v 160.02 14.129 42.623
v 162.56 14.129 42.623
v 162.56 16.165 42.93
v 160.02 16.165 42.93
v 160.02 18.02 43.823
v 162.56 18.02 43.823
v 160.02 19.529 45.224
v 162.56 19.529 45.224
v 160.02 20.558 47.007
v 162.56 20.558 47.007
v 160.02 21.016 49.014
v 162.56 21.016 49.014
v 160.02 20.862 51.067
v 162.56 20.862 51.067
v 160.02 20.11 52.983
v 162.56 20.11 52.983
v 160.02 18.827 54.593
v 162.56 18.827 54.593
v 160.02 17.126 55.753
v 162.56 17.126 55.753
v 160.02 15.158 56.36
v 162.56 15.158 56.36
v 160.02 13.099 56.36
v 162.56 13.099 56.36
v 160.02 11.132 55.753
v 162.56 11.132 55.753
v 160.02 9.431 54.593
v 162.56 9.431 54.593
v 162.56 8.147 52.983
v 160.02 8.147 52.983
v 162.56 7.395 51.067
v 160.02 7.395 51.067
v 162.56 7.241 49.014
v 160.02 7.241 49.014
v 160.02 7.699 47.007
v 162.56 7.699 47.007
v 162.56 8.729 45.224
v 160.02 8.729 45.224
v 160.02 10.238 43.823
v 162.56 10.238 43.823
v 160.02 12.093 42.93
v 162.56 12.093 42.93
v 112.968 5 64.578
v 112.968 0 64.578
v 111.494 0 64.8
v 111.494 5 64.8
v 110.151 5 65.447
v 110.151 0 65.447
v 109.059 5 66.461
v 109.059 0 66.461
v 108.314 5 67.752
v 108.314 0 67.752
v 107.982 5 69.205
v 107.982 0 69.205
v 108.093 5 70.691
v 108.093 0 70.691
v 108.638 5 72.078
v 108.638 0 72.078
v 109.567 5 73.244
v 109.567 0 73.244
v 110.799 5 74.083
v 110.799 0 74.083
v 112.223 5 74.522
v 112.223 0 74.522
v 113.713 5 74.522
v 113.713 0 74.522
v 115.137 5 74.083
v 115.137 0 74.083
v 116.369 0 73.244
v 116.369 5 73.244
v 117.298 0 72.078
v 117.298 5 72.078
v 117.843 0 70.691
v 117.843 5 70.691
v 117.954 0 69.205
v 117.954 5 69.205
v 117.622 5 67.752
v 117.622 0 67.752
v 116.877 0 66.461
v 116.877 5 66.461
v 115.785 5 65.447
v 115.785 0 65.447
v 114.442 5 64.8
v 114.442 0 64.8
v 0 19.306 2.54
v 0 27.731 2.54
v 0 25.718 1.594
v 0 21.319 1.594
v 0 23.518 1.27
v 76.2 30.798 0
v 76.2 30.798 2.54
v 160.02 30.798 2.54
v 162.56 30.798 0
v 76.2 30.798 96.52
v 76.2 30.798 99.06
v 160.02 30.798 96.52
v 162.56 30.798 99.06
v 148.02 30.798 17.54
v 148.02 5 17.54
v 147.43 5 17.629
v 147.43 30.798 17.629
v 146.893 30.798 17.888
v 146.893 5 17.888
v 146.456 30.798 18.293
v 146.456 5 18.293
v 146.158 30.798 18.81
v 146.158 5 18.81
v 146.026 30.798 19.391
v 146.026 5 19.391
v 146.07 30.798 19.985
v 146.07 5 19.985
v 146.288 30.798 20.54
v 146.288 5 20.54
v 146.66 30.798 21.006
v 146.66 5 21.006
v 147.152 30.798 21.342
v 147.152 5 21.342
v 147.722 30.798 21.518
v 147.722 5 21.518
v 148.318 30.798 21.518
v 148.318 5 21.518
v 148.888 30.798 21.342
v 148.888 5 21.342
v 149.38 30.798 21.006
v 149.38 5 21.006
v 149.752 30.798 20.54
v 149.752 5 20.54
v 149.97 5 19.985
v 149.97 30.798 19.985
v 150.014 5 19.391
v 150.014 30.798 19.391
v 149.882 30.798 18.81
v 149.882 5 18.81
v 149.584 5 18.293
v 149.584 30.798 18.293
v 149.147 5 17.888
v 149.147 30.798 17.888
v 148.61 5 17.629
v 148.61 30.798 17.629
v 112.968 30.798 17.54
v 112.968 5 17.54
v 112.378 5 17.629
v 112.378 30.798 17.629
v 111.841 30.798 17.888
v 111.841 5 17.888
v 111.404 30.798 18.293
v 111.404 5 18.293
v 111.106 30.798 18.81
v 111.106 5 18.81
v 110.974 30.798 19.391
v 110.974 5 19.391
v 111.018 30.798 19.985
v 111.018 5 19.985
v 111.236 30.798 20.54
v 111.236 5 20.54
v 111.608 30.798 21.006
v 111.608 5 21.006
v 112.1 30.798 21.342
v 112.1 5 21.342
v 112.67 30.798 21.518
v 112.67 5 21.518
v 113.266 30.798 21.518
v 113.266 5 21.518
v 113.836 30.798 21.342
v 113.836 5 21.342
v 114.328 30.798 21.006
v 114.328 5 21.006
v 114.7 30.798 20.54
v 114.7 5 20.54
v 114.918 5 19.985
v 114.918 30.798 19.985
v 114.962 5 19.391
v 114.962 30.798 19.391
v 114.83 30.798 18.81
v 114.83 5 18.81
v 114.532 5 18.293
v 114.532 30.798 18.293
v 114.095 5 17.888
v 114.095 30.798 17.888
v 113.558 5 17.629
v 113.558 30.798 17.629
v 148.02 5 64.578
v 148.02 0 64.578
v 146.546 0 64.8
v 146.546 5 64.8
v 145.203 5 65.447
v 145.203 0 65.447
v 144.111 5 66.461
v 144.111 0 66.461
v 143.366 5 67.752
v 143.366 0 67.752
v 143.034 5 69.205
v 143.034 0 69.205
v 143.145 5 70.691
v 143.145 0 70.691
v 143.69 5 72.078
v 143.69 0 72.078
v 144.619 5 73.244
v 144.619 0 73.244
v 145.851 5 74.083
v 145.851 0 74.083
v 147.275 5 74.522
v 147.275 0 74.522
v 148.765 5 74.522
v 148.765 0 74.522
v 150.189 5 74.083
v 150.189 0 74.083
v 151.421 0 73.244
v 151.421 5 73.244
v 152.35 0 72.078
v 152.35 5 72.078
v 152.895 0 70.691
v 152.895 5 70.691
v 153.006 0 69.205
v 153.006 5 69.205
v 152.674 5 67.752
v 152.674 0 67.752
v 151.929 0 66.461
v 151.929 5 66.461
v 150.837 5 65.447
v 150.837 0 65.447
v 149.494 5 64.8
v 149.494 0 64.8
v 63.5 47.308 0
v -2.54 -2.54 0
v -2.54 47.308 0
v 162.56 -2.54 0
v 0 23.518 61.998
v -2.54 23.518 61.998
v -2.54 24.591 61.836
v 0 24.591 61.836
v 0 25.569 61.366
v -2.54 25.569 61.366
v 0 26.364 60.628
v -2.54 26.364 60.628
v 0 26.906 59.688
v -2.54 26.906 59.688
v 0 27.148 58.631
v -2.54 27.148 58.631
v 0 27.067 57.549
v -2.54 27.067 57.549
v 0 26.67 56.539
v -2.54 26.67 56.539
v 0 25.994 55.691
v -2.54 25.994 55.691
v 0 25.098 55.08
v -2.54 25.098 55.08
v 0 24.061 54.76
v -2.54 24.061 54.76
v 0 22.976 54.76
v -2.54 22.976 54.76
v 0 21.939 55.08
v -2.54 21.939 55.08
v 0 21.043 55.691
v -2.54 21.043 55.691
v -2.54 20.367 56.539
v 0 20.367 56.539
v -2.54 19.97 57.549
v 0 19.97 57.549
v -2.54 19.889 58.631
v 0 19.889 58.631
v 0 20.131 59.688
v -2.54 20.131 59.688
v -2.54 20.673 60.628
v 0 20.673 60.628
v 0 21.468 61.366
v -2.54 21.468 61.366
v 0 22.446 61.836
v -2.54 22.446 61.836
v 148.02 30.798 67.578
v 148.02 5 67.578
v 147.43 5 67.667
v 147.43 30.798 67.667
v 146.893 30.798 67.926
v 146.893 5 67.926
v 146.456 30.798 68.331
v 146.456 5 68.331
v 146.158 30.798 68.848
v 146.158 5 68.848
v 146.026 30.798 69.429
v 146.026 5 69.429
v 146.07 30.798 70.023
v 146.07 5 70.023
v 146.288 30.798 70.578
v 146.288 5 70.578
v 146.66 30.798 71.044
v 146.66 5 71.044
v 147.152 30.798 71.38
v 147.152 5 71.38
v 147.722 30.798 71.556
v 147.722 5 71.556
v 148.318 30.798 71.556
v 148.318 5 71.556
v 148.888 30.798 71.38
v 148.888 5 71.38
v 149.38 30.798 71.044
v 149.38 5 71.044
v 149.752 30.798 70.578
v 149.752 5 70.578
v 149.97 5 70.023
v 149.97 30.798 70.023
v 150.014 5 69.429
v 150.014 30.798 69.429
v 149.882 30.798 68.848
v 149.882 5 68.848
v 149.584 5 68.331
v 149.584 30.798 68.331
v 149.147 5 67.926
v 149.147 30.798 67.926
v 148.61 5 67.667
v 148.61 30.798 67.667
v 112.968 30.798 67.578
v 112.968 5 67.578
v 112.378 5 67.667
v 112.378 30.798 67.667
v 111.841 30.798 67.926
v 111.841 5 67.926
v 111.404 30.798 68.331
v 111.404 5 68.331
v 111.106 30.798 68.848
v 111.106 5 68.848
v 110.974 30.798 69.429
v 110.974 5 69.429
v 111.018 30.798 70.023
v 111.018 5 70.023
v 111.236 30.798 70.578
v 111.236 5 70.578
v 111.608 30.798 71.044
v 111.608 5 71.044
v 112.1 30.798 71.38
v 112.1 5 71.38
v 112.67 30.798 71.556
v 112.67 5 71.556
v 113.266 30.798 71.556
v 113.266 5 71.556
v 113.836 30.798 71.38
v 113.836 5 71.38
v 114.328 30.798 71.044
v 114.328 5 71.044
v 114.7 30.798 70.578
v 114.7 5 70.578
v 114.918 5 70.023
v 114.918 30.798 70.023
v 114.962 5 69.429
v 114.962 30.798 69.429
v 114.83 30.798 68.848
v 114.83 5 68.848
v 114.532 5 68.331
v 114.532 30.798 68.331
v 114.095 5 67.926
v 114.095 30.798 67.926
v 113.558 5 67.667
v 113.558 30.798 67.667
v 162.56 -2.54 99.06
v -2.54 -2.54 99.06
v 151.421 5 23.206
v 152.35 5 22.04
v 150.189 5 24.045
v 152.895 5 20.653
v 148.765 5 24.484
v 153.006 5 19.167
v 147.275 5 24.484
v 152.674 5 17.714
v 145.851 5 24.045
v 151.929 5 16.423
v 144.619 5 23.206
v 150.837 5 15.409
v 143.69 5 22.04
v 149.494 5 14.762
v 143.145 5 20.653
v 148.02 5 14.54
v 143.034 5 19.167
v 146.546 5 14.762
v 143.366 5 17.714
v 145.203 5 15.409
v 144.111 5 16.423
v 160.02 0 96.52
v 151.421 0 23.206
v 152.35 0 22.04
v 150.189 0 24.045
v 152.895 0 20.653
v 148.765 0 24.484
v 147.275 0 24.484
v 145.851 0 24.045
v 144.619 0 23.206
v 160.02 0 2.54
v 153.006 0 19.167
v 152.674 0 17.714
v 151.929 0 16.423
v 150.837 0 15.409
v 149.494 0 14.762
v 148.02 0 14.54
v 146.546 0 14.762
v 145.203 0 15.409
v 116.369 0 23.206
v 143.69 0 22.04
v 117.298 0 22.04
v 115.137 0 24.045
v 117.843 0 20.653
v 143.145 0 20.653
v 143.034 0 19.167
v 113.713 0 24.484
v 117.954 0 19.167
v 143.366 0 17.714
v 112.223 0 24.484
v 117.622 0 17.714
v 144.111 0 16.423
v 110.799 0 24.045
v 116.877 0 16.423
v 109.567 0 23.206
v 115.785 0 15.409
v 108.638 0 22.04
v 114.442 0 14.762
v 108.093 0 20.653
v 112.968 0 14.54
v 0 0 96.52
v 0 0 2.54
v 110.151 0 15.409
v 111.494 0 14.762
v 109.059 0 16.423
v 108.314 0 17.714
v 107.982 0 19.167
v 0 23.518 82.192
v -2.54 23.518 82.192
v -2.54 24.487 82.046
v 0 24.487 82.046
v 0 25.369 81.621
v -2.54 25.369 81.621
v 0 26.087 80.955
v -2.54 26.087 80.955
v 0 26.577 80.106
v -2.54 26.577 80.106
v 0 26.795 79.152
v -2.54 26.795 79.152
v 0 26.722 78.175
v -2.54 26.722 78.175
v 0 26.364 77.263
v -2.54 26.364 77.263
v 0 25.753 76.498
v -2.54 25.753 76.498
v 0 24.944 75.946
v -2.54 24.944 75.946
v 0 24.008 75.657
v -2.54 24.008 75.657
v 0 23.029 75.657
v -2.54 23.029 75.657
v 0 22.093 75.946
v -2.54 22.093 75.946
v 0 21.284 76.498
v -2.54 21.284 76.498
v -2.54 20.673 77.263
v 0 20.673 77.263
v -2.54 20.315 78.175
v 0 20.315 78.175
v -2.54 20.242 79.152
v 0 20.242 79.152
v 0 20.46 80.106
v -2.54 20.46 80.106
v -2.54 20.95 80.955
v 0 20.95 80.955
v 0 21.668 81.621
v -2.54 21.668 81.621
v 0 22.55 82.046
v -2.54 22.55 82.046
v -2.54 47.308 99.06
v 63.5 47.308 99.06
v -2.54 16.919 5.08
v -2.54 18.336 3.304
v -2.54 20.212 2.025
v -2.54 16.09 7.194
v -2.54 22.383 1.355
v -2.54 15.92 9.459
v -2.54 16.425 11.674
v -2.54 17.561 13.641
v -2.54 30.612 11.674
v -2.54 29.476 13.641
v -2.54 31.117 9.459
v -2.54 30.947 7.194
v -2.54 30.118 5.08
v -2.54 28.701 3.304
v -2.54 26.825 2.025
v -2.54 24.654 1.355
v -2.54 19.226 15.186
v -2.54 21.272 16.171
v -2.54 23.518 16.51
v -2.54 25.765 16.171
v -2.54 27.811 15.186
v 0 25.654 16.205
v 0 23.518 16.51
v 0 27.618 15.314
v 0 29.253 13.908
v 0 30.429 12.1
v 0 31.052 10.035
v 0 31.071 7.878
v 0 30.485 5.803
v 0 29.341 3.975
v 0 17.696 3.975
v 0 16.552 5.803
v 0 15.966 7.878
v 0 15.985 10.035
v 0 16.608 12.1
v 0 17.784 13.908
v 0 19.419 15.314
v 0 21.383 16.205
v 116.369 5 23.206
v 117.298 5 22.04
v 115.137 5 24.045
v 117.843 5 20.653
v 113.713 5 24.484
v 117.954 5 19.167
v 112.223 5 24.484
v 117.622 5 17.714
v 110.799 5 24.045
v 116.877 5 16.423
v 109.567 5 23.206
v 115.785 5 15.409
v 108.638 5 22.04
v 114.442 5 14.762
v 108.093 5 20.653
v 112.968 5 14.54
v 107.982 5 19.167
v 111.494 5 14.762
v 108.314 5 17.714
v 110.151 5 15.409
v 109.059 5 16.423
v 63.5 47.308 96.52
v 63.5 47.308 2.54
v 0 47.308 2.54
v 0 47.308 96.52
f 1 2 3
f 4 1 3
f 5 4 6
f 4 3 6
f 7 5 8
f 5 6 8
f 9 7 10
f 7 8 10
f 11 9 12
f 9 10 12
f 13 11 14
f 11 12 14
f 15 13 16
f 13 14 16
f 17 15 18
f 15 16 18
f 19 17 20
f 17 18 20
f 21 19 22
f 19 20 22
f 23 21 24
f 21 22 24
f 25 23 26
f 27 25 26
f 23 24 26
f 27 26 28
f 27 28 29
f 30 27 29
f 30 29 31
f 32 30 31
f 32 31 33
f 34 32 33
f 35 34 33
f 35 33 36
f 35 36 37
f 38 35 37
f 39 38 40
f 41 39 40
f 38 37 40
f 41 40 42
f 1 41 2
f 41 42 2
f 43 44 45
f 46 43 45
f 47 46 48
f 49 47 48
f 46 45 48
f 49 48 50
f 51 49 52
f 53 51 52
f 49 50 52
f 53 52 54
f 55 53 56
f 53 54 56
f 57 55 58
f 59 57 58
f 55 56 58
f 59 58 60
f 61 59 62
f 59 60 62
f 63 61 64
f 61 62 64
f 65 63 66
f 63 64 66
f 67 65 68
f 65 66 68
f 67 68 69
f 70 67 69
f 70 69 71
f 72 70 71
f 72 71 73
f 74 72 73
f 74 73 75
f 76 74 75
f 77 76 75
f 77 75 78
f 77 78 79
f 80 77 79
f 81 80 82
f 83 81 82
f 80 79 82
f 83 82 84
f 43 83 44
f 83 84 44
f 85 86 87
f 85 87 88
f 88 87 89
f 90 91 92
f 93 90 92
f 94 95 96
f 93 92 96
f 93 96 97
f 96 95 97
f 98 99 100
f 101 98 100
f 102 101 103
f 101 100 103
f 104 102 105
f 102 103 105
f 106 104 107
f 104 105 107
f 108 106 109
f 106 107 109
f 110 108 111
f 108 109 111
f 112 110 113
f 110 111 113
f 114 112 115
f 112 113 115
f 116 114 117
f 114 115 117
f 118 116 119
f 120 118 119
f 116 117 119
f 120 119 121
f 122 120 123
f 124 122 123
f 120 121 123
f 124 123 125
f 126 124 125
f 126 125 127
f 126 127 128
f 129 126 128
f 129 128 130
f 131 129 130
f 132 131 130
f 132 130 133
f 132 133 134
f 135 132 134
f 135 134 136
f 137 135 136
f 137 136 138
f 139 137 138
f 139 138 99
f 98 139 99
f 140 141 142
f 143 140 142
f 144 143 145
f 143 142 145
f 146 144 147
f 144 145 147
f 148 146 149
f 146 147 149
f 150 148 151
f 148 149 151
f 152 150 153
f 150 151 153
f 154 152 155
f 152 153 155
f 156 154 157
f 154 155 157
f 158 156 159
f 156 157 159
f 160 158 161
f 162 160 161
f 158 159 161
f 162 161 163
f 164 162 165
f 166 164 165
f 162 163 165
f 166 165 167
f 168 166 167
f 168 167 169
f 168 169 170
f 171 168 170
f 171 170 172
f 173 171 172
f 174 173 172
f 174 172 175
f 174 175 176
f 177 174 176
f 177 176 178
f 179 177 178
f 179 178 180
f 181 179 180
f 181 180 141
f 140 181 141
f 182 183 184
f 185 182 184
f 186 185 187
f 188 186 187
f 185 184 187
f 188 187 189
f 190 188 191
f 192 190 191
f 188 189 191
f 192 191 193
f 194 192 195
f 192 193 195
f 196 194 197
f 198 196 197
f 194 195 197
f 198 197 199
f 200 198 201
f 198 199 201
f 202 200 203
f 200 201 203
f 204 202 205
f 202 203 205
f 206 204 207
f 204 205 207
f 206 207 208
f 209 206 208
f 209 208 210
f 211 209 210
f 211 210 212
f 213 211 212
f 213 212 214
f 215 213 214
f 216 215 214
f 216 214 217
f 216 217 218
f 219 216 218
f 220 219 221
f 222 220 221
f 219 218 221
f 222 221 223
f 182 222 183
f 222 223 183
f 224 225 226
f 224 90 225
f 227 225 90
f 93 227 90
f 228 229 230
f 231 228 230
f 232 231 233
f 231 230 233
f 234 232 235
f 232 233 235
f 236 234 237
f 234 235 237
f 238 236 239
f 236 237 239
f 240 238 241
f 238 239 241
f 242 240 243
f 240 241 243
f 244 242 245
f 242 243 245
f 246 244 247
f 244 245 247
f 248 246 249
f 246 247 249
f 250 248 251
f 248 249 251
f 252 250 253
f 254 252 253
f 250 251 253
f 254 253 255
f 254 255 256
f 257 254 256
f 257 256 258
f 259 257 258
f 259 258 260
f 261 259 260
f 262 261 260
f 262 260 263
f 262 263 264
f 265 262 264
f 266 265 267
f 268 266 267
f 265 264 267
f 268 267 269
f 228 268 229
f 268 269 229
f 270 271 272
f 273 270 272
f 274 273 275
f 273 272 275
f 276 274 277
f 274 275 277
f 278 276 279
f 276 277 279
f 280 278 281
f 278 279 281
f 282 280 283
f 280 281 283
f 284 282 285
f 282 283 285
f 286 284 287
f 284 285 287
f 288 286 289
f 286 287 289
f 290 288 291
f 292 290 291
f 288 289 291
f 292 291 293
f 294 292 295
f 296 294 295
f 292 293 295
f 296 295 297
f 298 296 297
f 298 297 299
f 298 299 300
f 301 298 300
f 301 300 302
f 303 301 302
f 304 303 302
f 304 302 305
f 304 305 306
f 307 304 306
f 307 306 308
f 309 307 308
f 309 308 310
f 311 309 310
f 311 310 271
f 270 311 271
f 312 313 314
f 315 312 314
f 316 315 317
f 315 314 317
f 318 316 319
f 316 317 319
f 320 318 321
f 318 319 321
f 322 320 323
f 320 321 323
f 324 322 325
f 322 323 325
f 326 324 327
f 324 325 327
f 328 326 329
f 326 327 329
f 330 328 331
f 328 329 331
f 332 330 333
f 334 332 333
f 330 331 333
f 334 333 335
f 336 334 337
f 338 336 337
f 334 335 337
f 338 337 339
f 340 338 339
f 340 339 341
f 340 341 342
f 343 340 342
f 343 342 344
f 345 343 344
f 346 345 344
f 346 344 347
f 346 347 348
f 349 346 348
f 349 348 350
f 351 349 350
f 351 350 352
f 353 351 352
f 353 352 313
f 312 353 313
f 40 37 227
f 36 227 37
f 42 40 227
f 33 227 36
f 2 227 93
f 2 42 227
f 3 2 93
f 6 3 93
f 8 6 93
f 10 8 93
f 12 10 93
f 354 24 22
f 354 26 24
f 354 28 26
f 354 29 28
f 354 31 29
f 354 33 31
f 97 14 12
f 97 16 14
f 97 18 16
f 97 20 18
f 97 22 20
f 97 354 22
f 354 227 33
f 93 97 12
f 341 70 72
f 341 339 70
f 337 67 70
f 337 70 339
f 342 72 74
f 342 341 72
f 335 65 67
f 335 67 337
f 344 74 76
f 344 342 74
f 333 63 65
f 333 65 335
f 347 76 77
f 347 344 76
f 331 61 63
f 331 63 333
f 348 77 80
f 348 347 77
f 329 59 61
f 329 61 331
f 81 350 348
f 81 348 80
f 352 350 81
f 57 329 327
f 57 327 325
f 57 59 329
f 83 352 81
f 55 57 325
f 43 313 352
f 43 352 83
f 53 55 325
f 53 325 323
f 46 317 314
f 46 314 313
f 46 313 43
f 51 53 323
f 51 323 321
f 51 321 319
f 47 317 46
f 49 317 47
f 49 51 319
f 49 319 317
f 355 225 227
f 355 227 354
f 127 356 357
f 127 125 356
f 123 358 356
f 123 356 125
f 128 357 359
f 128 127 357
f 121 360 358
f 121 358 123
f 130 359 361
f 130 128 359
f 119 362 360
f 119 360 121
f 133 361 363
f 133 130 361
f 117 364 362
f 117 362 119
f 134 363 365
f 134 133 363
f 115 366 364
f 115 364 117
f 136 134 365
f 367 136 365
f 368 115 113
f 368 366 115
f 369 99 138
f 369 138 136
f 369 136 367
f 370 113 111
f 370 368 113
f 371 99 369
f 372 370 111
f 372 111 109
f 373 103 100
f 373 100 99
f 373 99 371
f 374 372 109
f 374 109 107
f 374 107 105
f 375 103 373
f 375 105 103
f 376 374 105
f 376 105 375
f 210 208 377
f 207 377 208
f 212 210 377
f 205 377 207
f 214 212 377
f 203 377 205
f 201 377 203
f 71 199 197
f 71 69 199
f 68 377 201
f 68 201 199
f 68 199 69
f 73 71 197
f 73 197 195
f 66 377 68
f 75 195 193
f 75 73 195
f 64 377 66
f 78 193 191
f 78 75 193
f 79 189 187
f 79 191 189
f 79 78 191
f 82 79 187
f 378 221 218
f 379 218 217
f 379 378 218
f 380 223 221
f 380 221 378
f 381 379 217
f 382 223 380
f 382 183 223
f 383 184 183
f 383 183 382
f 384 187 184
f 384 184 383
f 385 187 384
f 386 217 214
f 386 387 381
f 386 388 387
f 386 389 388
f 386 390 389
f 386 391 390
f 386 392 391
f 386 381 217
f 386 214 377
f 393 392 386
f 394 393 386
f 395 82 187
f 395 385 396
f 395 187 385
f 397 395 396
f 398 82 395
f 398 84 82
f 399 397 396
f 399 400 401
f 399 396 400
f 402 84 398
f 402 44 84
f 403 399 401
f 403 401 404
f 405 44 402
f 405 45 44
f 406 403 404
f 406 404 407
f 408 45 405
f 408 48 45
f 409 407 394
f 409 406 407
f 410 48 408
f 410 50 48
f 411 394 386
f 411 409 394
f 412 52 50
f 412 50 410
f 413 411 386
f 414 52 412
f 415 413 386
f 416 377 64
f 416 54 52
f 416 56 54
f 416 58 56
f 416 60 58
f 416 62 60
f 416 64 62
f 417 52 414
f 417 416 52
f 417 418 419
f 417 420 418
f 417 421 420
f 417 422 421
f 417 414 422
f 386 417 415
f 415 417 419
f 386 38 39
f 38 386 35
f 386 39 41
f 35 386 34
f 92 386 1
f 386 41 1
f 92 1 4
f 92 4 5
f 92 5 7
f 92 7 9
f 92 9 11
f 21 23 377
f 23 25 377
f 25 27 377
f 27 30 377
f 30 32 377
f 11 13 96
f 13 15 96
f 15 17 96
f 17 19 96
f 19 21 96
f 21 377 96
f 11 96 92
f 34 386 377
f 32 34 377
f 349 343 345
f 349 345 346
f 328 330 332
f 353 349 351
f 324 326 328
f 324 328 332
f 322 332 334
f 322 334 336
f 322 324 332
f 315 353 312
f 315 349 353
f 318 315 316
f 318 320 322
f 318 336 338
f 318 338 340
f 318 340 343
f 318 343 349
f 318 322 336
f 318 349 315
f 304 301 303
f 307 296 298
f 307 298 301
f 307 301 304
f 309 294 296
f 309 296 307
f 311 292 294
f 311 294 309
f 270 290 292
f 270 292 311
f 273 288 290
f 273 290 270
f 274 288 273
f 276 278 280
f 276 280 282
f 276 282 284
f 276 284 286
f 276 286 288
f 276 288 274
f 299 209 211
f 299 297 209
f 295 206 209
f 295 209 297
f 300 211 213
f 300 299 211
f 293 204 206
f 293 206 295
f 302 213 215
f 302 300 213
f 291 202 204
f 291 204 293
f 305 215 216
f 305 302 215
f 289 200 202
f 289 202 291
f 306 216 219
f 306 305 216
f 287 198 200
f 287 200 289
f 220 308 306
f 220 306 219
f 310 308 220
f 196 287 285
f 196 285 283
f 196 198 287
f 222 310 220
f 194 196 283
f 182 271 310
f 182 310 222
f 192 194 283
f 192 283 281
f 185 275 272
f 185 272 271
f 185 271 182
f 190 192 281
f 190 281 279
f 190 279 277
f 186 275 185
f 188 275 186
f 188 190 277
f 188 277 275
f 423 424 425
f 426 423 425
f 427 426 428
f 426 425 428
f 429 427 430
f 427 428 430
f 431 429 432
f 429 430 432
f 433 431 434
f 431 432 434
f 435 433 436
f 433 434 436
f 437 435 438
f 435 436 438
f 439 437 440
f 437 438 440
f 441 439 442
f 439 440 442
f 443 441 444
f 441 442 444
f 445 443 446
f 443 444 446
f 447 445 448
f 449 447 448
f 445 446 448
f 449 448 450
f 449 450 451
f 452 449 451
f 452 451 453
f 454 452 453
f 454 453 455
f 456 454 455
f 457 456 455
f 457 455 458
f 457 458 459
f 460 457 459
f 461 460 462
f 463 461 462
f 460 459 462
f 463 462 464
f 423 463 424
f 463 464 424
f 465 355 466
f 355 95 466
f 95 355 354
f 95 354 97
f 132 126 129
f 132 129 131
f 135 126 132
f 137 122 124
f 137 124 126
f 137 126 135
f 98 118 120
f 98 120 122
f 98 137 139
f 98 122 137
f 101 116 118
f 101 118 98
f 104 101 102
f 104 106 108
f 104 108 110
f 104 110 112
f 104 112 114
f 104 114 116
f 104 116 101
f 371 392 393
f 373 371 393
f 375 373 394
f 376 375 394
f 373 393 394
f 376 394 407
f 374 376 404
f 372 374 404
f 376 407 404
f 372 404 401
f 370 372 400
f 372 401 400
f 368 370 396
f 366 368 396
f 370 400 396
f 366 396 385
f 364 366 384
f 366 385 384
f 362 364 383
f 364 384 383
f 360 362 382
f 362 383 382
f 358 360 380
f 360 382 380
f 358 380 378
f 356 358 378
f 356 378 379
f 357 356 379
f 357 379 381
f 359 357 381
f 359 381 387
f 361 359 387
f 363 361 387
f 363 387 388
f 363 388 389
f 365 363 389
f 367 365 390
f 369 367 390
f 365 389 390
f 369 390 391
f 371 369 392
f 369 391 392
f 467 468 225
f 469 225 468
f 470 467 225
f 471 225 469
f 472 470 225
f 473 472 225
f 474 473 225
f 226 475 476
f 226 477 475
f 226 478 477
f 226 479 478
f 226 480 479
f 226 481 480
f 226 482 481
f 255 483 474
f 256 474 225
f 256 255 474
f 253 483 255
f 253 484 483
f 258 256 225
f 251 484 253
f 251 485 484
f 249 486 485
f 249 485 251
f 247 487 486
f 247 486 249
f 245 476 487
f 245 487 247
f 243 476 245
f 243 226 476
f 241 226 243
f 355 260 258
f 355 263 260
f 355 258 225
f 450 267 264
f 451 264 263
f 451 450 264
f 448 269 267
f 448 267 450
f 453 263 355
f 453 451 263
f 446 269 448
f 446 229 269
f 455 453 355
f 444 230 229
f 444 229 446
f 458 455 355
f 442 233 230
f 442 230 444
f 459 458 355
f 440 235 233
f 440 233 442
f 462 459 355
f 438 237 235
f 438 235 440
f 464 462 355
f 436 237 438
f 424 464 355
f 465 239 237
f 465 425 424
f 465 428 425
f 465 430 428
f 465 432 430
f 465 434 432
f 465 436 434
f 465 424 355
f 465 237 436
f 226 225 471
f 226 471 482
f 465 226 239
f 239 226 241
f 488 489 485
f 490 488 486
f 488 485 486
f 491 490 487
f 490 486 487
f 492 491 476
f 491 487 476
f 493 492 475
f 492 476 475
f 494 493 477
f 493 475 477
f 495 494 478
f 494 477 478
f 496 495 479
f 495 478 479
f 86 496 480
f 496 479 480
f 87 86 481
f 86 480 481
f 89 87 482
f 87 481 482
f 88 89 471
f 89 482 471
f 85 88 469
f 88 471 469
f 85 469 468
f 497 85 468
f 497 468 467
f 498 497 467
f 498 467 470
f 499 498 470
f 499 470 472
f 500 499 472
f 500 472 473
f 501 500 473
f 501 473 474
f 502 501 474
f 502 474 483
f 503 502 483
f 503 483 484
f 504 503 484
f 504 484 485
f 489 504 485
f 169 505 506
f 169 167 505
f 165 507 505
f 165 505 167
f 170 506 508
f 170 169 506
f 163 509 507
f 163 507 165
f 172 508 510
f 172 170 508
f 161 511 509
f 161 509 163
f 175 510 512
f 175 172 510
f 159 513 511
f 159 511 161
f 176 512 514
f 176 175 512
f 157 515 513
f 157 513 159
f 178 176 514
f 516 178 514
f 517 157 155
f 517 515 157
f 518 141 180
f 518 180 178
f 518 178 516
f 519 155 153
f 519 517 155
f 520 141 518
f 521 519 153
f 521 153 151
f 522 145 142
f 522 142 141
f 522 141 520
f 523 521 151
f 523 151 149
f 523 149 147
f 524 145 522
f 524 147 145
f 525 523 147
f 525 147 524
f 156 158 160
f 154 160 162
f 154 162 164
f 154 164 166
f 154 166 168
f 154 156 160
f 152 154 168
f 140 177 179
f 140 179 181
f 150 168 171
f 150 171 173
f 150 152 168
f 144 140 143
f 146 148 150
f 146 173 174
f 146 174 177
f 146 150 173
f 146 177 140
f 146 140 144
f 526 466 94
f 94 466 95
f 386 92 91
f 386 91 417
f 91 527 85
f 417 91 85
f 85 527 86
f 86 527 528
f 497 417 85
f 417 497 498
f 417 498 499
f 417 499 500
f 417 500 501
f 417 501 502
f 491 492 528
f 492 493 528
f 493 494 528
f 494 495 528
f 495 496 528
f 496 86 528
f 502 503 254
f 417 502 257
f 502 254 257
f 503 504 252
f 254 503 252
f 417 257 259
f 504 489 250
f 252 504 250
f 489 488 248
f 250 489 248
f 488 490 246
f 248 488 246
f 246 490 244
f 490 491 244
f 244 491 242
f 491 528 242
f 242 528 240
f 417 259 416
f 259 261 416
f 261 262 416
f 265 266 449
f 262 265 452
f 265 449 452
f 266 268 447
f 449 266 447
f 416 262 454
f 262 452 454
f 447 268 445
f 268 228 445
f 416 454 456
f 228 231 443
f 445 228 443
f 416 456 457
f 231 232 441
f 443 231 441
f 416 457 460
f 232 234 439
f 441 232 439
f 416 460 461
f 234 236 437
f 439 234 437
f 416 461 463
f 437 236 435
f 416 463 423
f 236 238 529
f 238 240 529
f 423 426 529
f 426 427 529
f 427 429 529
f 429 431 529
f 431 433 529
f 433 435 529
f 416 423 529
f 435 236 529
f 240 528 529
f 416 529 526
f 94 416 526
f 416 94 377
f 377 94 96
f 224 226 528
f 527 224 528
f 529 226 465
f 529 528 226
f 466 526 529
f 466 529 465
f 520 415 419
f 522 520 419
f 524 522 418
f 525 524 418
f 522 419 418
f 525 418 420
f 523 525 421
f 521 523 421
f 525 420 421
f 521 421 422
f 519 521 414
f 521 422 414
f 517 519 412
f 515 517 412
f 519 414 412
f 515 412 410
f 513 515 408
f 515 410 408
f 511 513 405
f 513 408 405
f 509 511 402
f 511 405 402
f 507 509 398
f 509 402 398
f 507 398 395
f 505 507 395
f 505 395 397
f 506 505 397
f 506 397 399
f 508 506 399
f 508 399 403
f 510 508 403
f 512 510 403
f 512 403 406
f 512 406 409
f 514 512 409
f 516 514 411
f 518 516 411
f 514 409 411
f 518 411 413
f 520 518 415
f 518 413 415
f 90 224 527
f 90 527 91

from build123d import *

# Parameters (mm, degrees)
BOSS_EXTRUDE1_DEPTH  = 2.54
SKETCH2_W            = 152.4
SKETCH2_H            = 93.98
BOSS_EXTRUDE2_DEPTH  = 2.54
BOSS_EXTRUDE3_DEPTH  = 2.54
SKETCH4_W            = 152.4
SKETCH4_H            = 2.54
BOSS_EXTRUDE4_DEPTH  = 2.54
BOSS_EXTRUDE13_DEPTH = 2.54
BOSS_EXTRUDE14_DEPTH = 2.54
SKETCH19_W           = 7.62
SKETCH19_H           = 33.3375
BOSS_EXTRUDE15_DEPTH = 2.54
SKETCH20_W           = 7.62
SKETCH20_H           = 33.3375
BOSS_EXTRUDE16_DEPTH = 2.54
SKETCH21_W           = 93.98
SKETCH21_H           = 2.54
BOSS_EXTRUDE17_DEPTH = 7.62
SKETCH22_W           = 2.54
SKETCH22_H           = 33.3375
BOSS_EXTRUDE18_DEPTH = 99.06
SKETCH23_W           = 99.06
SKETCH23_H           = 49.8475
BOSS_EXTRUDE19_DEPTH = 2.54
SKETCH24_R           = 3.639281935
SKETCH24_R_2         = 7.62
SKETCH24_R_3         = 3.285560526
CUT_EXTRUDE2_DEPTH   = 2.54
SKETCH25_R           = 6.906854853
CUT_EXTRUDE3_DEPTH   = 2.54
SKETCH29_R           = 2
BOSS_EXTRUDE20_DEPTH = 30.7975
SKETCH31_R           = 5
BOSS_EXTRUDE21_DEPTH = 5


with BuildPart() as part:
    # Sketch1 → Boss-Extrude1 (new body)
    with BuildSketch(Plane.XY):
        Polygon((0, 0), (152.4, 0), (152.4, 26.9875), (76.2, 26.9875), (63.5, 43.4975), (0, 43.4975), align=None)
    extrude(amount=BOSS_EXTRUDE1_DEPTH)



with BuildPart() as body_2:
    # Sketch2 → Boss-Extrude2 (new body)
    with BuildSketch(Plane(origin=(0, 0, 0), x_dir=(-1, 0, 0), z_dir=(0, -1, 0))):
        with Locations((-76.2, -49.53)):
            Rectangle(SKETCH2_W, SKETCH2_H)
    extrude(amount=BOSS_EXTRUDE2_DEPTH)

    # Sketch3 → Boss-Extrude3 (add)
    with BuildSketch(Plane.XY.offset(96.52)):
        Polygon((0, 0), (0, 43.4975), (63.5, 43.4975), (76.2, 26.9875), (152.4, 26.9875), (152.4, -2.54), (0, -2.54), align=None)
    extrude(amount=BOSS_EXTRUDE3_DEPTH)


with BuildPart() as part_1:
    add(part.part)

    add(body_2.part)  # Boss-Extrude4 merges body 2
    # Sketch4 → Boss-Extrude4 (add)
    with BuildSketch(Plane(origin=(0, 0, 2.54), x_dir=(-1, 0, 0), z_dir=(0, 0, -1))):
        with Locations((-76.2, -1.27)):
            Rectangle(SKETCH4_W, SKETCH4_H)
    extrude(amount=BOSS_EXTRUDE4_DEPTH)

    # Sketch10 → Boss-Extrude13 (add)
    with BuildSketch(Plane(origin=(0, 0, 0), x_dir=(-1, 0, 0), z_dir=(0, 0, -1))):
        Polygon((0, 43.4975), (0, 47.3075), (-63.5, 47.3075), (-76.2, 30.7975), (-152.4, 30.7975), (-152.4, 26.9875), (-76.2, 26.9875), (-63.5, 43.4975), align=None)
    extrude(amount=-BOSS_EXTRUDE13_DEPTH)

    # Sketch18 → Boss-Extrude14 (add)
    with BuildSketch(Plane.XY.offset(99.06)):
        Polygon((0, 43.4975), (0, 47.3075), (63.5, 47.3075), (76.2, 30.7975), (152.4, 30.7975), (152.4, 26.9875), (76.2, 26.9875), (63.5, 43.4975), align=None)
    extrude(amount=-BOSS_EXTRUDE14_DEPTH)

    # Sketch19 → Boss-Extrude15 (add)
    with BuildSketch(Plane.XY.offset(99.06)):
        with Locations((156.21, 14.12875)):
            Rectangle(SKETCH19_W, SKETCH19_H)
    extrude(amount=-BOSS_EXTRUDE15_DEPTH)

    # Sketch20 → Boss-Extrude16 (add)
    with BuildSketch(Plane(origin=(0, 0, 0), x_dir=(-1, 0, 0), z_dir=(0, 0, -1))):
        with Locations((-156.21, 14.12875)):
            Rectangle(SKETCH20_W, SKETCH20_H)
    extrude(amount=-BOSS_EXTRUDE16_DEPTH)

    # Sketch21 → Boss-Extrude17 (add)
    with BuildSketch(Plane(origin=(152.4, 0, 0), x_dir=(0, 0, -1), z_dir=(1, 0, 0))):
        with Locations((-49.53, -1.27)):
            Rectangle(SKETCH21_W, SKETCH21_H)
    extrude(amount=BOSS_EXTRUDE17_DEPTH)

    # Sketch22 → Boss-Extrude18 (add)
    with BuildSketch(Plane.XY.offset(99.06)):
        with Locations((161.29, 14.12875)):
            Rectangle(SKETCH22_W, SKETCH22_H)
    extrude(amount=-BOSS_EXTRUDE18_DEPTH)

    # Sketch23 → Boss-Extrude19 (add)
    with BuildSketch(Plane.ZY):
        with Locations((49.53, 22.38375)):
            Rectangle(SKETCH23_W, SKETCH23_H)
    extrude(amount=BOSS_EXTRUDE19_DEPTH)

    # Sketch24 → Cut-Extrude2 (cut)
    with BuildSketch(Plane.ZY.offset(2.54)):
        with Locations((58.358660758, 23.518484008)):
            Circle(SKETCH24_R)
        with Locations((8.89, 23.518484008)):
            Circle(SKETCH24_R_2)
        with Locations((78.906077051, 23.518484008)):
            Circle(SKETCH24_R_3)
    extrude(amount=-CUT_EXTRUDE2_DEPTH, mode=Mode.SUBTRACT)

    # Sketch25 → Cut-Extrude3 (cut)
    with BuildSketch(Plane(origin=(162.56, 0, 0), x_dir=(0, 0, -1), z_dir=(1, 0, 0))):
        with Locations((-49.53, 14.12875)):
            Circle(SKETCH25_R)
    extrude(amount=-CUT_EXTRUDE3_DEPTH, mode=Mode.SUBTRACT)

    # Sketch29 → Boss-Extrude20 (add)
    with BuildSketch(Plane(origin=(0, 0, 0), x_dir=(1, 0, 0), z_dir=(0, 1, 0))):
        with Locations(Location((112.968, -19.540242478, 0), (0, 0, 90))):
            Circle(SKETCH29_R)
        with Locations(Location((148.02, -19.540242478, 0), (0, 0, 90))):
            Circle(SKETCH29_R)
        with Locations(Location((112.968, -69.578242478, 0), (0, 0, 90))):
            Circle(SKETCH29_R)
        with Locations(Location((148.02, -69.578242478, 0), (0, 0, 90))):
            Circle(SKETCH29_R)
    extrude(amount=BOSS_EXTRUDE20_DEPTH)

    # Sketch31 → Boss-Extrude21 (add)
    with BuildSketch(Plane(origin=(0, 0, 0), x_dir=(1, 0, 0), z_dir=(0, 1, 0))):
        with Locations(Location((112.968, -19.540242478, 0), (0, 0, 90))):
            Circle(SKETCH31_R)
        with Locations(Location((148.02, -19.540242478, 0), (0, 0, 90))):
            Circle(SKETCH31_R)
        with Locations(Location((112.968, -69.578242478, 0), (0, 0, 90))):
            Circle(SKETCH31_R)
        with Locations(Location((148.02, -69.578242478, 0), (0, 0, 90))):
            Circle(SKETCH31_R)
    extrude(amount=BOSS_EXTRUDE21_DEPTH)


solid = part_1.part
